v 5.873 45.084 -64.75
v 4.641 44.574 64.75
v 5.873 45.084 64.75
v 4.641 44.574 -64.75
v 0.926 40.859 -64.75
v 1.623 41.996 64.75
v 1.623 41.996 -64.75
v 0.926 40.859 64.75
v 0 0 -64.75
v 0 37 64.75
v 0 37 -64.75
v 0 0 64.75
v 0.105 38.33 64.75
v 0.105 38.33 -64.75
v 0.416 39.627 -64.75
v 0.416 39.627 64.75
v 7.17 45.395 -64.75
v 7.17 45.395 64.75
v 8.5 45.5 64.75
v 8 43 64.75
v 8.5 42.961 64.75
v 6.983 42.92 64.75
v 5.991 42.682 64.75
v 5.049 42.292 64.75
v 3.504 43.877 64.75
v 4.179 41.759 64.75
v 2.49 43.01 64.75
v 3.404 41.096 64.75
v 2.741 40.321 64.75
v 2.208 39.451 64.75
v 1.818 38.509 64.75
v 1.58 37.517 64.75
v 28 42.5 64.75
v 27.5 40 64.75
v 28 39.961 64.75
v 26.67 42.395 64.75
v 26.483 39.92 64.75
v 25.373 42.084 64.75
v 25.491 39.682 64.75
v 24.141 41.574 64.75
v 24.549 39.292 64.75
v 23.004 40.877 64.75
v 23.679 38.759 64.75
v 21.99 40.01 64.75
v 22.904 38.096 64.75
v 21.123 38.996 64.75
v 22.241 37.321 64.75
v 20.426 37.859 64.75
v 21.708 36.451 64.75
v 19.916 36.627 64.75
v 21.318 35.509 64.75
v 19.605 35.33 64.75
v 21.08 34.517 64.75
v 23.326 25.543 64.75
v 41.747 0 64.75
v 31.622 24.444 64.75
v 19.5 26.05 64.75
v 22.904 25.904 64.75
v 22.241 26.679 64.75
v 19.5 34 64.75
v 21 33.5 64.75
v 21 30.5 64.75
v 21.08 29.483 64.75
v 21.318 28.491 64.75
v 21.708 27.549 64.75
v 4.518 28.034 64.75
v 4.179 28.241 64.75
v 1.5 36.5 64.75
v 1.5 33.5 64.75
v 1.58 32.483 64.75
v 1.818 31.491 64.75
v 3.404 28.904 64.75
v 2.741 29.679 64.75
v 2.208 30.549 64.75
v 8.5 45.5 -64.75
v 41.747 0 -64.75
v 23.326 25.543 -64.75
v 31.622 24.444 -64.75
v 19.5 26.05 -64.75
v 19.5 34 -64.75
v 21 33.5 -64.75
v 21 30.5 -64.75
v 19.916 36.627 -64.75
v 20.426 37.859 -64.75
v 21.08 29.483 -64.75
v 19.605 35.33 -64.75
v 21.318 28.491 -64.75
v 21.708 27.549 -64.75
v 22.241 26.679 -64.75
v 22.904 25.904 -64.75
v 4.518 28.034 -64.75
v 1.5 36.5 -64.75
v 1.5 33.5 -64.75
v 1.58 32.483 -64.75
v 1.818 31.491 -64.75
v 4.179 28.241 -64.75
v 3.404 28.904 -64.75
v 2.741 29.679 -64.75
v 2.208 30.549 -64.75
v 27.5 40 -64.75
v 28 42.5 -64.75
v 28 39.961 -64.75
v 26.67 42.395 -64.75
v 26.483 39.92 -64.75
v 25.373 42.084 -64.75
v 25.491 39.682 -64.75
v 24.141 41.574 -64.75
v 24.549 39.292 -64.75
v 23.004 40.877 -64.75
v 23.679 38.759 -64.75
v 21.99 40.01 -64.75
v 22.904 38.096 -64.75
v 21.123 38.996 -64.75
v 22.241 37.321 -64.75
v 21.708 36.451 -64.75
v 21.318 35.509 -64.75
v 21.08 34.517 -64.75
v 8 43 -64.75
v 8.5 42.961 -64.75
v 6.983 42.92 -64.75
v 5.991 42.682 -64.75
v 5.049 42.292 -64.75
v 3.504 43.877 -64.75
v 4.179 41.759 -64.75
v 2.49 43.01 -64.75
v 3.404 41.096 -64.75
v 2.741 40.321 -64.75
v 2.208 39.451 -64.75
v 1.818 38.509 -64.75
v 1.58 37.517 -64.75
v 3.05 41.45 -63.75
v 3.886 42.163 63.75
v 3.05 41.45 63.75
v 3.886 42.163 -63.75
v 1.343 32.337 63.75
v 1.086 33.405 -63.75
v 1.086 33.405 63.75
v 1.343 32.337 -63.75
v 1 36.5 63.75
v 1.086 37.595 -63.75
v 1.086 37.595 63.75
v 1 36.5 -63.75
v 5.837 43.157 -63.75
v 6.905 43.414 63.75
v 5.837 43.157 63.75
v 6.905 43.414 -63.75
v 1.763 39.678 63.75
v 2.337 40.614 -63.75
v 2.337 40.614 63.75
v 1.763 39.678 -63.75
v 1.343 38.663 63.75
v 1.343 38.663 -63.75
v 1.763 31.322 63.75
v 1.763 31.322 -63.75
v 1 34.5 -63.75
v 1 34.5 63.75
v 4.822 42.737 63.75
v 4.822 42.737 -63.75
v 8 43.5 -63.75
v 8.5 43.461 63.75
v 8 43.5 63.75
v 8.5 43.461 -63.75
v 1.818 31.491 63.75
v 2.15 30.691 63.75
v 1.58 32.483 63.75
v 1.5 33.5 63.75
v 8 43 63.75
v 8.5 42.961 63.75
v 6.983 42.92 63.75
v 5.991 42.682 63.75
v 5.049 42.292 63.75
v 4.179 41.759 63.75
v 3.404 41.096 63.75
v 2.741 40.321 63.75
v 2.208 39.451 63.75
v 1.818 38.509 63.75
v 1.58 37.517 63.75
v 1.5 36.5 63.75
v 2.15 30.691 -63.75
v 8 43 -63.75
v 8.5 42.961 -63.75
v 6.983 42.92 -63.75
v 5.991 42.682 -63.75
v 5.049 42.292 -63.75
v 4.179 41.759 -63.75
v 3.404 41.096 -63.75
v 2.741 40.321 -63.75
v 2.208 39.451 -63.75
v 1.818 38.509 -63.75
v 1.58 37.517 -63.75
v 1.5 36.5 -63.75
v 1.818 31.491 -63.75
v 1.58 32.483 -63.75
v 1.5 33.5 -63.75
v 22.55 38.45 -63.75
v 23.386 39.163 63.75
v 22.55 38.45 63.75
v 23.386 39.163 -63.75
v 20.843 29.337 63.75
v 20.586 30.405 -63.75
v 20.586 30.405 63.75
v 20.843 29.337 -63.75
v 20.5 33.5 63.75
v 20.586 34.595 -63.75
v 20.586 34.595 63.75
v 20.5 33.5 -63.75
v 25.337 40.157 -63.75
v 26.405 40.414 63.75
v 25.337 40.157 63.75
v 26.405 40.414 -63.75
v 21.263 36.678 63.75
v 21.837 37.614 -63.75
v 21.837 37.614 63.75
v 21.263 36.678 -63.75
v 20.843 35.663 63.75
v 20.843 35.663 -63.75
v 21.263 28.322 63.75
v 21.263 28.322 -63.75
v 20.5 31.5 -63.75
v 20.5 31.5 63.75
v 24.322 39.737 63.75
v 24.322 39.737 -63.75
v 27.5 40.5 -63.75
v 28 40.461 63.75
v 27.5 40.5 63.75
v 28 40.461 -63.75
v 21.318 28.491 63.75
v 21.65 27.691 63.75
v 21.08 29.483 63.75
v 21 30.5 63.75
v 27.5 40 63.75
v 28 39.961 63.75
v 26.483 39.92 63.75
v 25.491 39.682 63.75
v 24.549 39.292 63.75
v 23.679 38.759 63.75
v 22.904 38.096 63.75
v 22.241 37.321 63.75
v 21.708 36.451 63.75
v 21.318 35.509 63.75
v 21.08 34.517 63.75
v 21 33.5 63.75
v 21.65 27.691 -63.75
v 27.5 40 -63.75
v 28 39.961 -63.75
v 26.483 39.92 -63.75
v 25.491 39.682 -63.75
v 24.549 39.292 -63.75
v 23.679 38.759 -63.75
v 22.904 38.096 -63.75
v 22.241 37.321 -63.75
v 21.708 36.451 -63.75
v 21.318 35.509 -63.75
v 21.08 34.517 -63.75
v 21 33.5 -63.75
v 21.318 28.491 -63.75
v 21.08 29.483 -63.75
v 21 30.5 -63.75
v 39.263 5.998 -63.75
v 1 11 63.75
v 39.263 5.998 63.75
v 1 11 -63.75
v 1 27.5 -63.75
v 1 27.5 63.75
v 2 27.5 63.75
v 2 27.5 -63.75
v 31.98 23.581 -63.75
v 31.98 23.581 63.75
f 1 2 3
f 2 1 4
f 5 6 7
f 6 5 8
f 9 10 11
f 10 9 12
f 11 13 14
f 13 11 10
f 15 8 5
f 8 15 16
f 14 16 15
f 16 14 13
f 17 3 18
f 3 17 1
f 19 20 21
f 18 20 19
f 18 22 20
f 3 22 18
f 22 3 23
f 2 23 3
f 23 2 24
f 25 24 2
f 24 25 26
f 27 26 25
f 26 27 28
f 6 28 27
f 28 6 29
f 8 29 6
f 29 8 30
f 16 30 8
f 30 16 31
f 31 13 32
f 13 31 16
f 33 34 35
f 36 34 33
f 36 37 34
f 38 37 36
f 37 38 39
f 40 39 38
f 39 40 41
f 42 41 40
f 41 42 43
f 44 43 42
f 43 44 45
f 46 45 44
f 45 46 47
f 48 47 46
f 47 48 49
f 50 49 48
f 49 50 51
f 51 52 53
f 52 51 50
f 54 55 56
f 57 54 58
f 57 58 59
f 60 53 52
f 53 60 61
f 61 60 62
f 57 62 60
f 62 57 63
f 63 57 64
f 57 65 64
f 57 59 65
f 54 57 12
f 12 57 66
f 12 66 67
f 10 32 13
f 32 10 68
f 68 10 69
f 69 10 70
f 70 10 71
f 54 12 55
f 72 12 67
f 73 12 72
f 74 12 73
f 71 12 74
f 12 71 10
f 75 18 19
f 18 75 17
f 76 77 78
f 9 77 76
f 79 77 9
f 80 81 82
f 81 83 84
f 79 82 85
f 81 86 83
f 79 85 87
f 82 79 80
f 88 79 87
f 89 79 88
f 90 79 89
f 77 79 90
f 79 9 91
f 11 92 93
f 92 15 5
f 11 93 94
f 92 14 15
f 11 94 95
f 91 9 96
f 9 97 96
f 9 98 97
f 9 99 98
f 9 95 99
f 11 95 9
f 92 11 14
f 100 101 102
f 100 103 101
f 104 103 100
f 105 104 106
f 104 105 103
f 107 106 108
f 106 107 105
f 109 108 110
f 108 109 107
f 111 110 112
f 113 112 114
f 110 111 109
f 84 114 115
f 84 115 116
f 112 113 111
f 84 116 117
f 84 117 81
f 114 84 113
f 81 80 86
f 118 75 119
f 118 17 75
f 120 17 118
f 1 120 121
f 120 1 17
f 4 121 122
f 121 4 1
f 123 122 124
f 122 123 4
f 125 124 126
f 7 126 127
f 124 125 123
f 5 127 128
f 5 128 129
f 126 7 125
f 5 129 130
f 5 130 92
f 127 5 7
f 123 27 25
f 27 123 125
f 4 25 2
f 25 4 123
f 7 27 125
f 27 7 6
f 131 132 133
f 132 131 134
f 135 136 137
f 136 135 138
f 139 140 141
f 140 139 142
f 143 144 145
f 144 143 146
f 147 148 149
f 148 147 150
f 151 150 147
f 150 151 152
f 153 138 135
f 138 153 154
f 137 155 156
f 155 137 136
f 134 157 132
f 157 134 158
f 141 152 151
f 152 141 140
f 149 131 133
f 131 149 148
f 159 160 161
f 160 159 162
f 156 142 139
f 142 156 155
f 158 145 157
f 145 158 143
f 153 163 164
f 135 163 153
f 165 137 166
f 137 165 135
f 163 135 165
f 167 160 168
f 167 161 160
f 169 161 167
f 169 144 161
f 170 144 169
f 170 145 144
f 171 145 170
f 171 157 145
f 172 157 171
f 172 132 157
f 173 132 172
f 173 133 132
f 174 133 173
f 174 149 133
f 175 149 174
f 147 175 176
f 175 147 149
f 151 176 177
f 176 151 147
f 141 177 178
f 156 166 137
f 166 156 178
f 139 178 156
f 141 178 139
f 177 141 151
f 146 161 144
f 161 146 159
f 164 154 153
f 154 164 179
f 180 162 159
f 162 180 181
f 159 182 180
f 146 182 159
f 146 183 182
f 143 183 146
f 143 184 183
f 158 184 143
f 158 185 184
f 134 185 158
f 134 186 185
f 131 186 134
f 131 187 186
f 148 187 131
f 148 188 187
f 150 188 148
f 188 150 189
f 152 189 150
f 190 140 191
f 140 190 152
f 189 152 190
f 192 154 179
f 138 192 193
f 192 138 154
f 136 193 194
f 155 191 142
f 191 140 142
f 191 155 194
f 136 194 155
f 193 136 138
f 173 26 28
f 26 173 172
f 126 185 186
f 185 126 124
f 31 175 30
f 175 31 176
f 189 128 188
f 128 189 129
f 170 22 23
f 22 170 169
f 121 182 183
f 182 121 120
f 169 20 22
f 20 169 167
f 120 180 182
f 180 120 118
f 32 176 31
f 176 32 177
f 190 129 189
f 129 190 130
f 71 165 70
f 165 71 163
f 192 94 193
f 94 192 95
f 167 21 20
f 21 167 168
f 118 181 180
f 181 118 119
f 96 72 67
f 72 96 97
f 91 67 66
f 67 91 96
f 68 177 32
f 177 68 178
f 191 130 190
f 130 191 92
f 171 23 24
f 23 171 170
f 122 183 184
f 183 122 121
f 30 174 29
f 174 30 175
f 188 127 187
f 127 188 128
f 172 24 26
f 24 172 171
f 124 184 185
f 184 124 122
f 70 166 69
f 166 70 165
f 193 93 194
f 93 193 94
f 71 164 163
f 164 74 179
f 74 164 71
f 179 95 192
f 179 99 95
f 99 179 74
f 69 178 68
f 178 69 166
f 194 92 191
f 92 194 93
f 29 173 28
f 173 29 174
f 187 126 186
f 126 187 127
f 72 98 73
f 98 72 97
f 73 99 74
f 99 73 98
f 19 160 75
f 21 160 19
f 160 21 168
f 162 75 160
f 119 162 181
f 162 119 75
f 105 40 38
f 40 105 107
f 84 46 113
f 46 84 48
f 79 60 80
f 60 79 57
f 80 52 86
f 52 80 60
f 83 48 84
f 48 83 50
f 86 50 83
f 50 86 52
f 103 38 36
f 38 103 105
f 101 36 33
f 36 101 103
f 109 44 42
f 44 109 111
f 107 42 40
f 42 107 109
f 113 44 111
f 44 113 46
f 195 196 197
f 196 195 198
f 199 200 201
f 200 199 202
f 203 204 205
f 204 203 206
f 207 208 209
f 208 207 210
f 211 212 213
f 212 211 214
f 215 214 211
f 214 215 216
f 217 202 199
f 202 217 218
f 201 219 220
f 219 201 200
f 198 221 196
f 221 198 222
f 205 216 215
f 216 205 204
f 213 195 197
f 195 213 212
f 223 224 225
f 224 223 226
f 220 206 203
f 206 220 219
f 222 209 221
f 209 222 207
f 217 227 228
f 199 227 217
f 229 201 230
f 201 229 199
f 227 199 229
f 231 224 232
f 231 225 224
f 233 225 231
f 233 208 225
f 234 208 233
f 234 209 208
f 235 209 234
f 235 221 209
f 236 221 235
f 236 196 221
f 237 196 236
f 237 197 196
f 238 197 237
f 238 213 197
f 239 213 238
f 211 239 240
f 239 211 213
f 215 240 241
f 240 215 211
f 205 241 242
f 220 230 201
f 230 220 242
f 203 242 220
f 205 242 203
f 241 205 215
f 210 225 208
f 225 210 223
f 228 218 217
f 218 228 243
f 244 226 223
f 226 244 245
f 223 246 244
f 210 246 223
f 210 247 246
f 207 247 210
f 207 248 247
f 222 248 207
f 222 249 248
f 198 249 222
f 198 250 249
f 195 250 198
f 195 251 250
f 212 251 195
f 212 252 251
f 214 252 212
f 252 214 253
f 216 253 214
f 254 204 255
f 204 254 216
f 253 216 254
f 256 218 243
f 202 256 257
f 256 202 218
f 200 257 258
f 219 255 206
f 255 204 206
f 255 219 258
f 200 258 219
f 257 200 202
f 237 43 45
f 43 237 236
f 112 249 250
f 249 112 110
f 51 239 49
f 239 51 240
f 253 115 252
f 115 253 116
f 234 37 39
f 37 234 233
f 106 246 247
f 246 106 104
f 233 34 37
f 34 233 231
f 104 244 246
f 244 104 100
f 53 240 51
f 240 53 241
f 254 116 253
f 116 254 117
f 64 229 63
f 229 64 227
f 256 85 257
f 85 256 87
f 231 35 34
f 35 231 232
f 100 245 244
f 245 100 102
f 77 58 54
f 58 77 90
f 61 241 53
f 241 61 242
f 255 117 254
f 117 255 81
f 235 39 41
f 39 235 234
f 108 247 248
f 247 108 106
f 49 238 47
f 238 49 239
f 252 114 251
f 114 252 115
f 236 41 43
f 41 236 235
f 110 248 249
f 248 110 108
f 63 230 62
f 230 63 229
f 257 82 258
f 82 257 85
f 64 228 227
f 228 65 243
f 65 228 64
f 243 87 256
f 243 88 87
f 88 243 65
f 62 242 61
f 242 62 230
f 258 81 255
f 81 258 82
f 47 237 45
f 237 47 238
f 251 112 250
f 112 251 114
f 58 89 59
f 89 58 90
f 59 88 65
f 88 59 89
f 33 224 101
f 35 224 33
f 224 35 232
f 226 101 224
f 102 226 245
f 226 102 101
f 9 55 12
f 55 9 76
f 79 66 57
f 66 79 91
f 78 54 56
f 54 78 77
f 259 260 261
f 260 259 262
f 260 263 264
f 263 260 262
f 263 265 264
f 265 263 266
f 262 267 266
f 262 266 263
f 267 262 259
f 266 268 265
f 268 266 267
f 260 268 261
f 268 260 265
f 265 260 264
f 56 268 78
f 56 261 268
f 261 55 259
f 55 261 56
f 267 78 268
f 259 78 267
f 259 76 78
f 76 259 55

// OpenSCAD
// Wall Mounted Multi Card Holder Extention
// By Brian Khuu 2022-04-22
// Dev Note: Originally for businesscard, but modified for OffersAndNeeds 3D printed wall
$fn = 40;

print_layer_height = 0.2; //< This is the value you used when printing the main holder. This will indicate the amount of gap needed for the mounting slot

// Index Card
// 76 x 127mm (More like 126mm width when measured)
businesscard_width = 127.5; // 127mm (Plus 0.5 tol)
businesscard_height = 76.5; // 76mm (add 0.5mm tol)
businesscard_thickness = 1.5; // 0.25mm for thin paper cards. 0.8mm for thick plastic cards. We need to add extra thickness to account for layer droop

// Holder
wall_spacing = 2;
wall_card_grip = 20;

// Calc
wall_base = print_layer_height*3+0.1;
wall_top = print_layer_height*3+0.1;
wall_height = wall_base + businesscard_thickness + wall_top*2;

// Main Holder
holder_thickness = 1.0;
holder_slot_depth = businesscard_thickness*11; // 10 business cards (1 businesscard tolerance)
holder_slot_shift = 10;

// Pen Holder
penHolder_thickness = 1;
penHolder_pendia = 13;

module penholder() {
    intersection()
    {

        penHolder_outerdia = penHolder_pendia+penHolder_thickness*2+2;
        penHolder_outerGripDia = penHolder_pendia;
        penHolder_innerdia = penHolder_pendia+1;
        difference()
        {
            hull()
            {
                translate([0,holder_slot_depth+holder_thickness*2+holder_slot_shift,penHolder_outerdia/2])
                    rotate([0,90,0])
                        cylinder(d=penHolder_outerdia, h=(businesscard_width+holder_thickness*2), center=true);
                translate([0,holder_slot_depth+holder_thickness*2+holder_slot_shift+penHolder_outerdia/2,penHolder_outerdia/2])
                    rotate([0,90,0])
                        cylinder(d=penHolder_outerdia, h=(businesscard_width+holder_thickness*2), center=true);
            }
            hull()
            {
                translate([0,holder_slot_depth+holder_thickness*2+holder_slot_shift+penHolder_innerdia/2+penHolder_thickness-2,penHolder_innerdia/2+penHolder_thickness])
                    rotate([0,90,0])
                        cylinder(d=penHolder_innerdia, h=businesscard_width, center=true);
                translate([0,holder_slot_depth+holder_thickness*2+holder_slot_shift+penHolder_innerdia/2+penHolder_thickness,penHolder_innerdia/2+penHolder_thickness])
                    rotate([0,90,0])
                        cylinder(d=penHolder_innerdia, h=businesscard_width, center=true);
            }
            hull()
            {
                translate([0,holder_slot_depth+holder_thickness*2+holder_slot_shift+penHolder_innerdia/2+penHolder_thickness-3,penHolder_innerdia/2+penHolder_thickness])
                    rotate([0,90,0])
                        cylinder(d=penHolder_outerGripDia, h=businesscard_width+holder_thickness*2+0.1, center=true);
                translate([0,holder_slot_depth+holder_thickness*2+holder_slot_shift+penHolder_innerdia/2+penHolder_thickness,penHolder_innerdia/2+penHolder_thickness])
                    rotate([0,90,0])
                        cylinder(d=penHolder_outerGripDia, h=businesscard_width+holder_thickness*2+0.1, center=true);
            }
        }
        translate([0,holder_slot_depth+holder_thickness*2+holder_slot_shift+penHolder_thickness,penHolder_outerdia/4])
        cube([businesscard_width+holder_thickness*2,penHolder_outerdia*2,penHolder_outerdia/2],center=true);
    }

}

color("SaddleBrown")
rotate([0,90,0])
difference()
{
    // Bulk
    union()
    {
        hull()
        {
            translate([-(businesscard_width+holder_thickness*2)/2, 0, businesscard_height-holder_thickness])
                cube([(businesscard_width+holder_thickness*2), holder_slot_depth+holder_thickness*2, 1]);
            translate([-(businesscard_width+holder_thickness*2)/2, 0, 0])
                cube([(businesscard_width+holder_thickness*2), holder_slot_depth+holder_thickness*2+holder_slot_shift, 1]);
                
            
        }
        // Pen Cut
        penholder();
        translate([0, -3, penHolder_pendia + penHolder_pendia/2])
            penholder();
        
    }

    // Card
    hull()
    {
        translate([-(businesscard_width)/2, holder_thickness, holder_thickness+businesscard_height])
            cube([(businesscard_width), holder_slot_depth, 1]);
        translate([-(businesscard_width)/2, holder_thickness+holder_slot_shift, holder_thickness])
            cube([(businesscard_width), holder_slot_depth, 1]);
    }
    
    // Slot Cut
    hull()
    {
        translate([0, (holder_slot_depth+holder_thickness*3)/2, businesscard_height/2])
            rotate([-45/2,0,0])
            cube([(businesscard_width*2), holder_slot_depth*2, 1], center=true);
        translate([0, (holder_slot_depth+holder_thickness*3)/2, businesscard_height])
            rotate([0,0,0])
            cube([(businesscard_width*2), holder_slot_depth*2, 1], center=true);
    }
}
